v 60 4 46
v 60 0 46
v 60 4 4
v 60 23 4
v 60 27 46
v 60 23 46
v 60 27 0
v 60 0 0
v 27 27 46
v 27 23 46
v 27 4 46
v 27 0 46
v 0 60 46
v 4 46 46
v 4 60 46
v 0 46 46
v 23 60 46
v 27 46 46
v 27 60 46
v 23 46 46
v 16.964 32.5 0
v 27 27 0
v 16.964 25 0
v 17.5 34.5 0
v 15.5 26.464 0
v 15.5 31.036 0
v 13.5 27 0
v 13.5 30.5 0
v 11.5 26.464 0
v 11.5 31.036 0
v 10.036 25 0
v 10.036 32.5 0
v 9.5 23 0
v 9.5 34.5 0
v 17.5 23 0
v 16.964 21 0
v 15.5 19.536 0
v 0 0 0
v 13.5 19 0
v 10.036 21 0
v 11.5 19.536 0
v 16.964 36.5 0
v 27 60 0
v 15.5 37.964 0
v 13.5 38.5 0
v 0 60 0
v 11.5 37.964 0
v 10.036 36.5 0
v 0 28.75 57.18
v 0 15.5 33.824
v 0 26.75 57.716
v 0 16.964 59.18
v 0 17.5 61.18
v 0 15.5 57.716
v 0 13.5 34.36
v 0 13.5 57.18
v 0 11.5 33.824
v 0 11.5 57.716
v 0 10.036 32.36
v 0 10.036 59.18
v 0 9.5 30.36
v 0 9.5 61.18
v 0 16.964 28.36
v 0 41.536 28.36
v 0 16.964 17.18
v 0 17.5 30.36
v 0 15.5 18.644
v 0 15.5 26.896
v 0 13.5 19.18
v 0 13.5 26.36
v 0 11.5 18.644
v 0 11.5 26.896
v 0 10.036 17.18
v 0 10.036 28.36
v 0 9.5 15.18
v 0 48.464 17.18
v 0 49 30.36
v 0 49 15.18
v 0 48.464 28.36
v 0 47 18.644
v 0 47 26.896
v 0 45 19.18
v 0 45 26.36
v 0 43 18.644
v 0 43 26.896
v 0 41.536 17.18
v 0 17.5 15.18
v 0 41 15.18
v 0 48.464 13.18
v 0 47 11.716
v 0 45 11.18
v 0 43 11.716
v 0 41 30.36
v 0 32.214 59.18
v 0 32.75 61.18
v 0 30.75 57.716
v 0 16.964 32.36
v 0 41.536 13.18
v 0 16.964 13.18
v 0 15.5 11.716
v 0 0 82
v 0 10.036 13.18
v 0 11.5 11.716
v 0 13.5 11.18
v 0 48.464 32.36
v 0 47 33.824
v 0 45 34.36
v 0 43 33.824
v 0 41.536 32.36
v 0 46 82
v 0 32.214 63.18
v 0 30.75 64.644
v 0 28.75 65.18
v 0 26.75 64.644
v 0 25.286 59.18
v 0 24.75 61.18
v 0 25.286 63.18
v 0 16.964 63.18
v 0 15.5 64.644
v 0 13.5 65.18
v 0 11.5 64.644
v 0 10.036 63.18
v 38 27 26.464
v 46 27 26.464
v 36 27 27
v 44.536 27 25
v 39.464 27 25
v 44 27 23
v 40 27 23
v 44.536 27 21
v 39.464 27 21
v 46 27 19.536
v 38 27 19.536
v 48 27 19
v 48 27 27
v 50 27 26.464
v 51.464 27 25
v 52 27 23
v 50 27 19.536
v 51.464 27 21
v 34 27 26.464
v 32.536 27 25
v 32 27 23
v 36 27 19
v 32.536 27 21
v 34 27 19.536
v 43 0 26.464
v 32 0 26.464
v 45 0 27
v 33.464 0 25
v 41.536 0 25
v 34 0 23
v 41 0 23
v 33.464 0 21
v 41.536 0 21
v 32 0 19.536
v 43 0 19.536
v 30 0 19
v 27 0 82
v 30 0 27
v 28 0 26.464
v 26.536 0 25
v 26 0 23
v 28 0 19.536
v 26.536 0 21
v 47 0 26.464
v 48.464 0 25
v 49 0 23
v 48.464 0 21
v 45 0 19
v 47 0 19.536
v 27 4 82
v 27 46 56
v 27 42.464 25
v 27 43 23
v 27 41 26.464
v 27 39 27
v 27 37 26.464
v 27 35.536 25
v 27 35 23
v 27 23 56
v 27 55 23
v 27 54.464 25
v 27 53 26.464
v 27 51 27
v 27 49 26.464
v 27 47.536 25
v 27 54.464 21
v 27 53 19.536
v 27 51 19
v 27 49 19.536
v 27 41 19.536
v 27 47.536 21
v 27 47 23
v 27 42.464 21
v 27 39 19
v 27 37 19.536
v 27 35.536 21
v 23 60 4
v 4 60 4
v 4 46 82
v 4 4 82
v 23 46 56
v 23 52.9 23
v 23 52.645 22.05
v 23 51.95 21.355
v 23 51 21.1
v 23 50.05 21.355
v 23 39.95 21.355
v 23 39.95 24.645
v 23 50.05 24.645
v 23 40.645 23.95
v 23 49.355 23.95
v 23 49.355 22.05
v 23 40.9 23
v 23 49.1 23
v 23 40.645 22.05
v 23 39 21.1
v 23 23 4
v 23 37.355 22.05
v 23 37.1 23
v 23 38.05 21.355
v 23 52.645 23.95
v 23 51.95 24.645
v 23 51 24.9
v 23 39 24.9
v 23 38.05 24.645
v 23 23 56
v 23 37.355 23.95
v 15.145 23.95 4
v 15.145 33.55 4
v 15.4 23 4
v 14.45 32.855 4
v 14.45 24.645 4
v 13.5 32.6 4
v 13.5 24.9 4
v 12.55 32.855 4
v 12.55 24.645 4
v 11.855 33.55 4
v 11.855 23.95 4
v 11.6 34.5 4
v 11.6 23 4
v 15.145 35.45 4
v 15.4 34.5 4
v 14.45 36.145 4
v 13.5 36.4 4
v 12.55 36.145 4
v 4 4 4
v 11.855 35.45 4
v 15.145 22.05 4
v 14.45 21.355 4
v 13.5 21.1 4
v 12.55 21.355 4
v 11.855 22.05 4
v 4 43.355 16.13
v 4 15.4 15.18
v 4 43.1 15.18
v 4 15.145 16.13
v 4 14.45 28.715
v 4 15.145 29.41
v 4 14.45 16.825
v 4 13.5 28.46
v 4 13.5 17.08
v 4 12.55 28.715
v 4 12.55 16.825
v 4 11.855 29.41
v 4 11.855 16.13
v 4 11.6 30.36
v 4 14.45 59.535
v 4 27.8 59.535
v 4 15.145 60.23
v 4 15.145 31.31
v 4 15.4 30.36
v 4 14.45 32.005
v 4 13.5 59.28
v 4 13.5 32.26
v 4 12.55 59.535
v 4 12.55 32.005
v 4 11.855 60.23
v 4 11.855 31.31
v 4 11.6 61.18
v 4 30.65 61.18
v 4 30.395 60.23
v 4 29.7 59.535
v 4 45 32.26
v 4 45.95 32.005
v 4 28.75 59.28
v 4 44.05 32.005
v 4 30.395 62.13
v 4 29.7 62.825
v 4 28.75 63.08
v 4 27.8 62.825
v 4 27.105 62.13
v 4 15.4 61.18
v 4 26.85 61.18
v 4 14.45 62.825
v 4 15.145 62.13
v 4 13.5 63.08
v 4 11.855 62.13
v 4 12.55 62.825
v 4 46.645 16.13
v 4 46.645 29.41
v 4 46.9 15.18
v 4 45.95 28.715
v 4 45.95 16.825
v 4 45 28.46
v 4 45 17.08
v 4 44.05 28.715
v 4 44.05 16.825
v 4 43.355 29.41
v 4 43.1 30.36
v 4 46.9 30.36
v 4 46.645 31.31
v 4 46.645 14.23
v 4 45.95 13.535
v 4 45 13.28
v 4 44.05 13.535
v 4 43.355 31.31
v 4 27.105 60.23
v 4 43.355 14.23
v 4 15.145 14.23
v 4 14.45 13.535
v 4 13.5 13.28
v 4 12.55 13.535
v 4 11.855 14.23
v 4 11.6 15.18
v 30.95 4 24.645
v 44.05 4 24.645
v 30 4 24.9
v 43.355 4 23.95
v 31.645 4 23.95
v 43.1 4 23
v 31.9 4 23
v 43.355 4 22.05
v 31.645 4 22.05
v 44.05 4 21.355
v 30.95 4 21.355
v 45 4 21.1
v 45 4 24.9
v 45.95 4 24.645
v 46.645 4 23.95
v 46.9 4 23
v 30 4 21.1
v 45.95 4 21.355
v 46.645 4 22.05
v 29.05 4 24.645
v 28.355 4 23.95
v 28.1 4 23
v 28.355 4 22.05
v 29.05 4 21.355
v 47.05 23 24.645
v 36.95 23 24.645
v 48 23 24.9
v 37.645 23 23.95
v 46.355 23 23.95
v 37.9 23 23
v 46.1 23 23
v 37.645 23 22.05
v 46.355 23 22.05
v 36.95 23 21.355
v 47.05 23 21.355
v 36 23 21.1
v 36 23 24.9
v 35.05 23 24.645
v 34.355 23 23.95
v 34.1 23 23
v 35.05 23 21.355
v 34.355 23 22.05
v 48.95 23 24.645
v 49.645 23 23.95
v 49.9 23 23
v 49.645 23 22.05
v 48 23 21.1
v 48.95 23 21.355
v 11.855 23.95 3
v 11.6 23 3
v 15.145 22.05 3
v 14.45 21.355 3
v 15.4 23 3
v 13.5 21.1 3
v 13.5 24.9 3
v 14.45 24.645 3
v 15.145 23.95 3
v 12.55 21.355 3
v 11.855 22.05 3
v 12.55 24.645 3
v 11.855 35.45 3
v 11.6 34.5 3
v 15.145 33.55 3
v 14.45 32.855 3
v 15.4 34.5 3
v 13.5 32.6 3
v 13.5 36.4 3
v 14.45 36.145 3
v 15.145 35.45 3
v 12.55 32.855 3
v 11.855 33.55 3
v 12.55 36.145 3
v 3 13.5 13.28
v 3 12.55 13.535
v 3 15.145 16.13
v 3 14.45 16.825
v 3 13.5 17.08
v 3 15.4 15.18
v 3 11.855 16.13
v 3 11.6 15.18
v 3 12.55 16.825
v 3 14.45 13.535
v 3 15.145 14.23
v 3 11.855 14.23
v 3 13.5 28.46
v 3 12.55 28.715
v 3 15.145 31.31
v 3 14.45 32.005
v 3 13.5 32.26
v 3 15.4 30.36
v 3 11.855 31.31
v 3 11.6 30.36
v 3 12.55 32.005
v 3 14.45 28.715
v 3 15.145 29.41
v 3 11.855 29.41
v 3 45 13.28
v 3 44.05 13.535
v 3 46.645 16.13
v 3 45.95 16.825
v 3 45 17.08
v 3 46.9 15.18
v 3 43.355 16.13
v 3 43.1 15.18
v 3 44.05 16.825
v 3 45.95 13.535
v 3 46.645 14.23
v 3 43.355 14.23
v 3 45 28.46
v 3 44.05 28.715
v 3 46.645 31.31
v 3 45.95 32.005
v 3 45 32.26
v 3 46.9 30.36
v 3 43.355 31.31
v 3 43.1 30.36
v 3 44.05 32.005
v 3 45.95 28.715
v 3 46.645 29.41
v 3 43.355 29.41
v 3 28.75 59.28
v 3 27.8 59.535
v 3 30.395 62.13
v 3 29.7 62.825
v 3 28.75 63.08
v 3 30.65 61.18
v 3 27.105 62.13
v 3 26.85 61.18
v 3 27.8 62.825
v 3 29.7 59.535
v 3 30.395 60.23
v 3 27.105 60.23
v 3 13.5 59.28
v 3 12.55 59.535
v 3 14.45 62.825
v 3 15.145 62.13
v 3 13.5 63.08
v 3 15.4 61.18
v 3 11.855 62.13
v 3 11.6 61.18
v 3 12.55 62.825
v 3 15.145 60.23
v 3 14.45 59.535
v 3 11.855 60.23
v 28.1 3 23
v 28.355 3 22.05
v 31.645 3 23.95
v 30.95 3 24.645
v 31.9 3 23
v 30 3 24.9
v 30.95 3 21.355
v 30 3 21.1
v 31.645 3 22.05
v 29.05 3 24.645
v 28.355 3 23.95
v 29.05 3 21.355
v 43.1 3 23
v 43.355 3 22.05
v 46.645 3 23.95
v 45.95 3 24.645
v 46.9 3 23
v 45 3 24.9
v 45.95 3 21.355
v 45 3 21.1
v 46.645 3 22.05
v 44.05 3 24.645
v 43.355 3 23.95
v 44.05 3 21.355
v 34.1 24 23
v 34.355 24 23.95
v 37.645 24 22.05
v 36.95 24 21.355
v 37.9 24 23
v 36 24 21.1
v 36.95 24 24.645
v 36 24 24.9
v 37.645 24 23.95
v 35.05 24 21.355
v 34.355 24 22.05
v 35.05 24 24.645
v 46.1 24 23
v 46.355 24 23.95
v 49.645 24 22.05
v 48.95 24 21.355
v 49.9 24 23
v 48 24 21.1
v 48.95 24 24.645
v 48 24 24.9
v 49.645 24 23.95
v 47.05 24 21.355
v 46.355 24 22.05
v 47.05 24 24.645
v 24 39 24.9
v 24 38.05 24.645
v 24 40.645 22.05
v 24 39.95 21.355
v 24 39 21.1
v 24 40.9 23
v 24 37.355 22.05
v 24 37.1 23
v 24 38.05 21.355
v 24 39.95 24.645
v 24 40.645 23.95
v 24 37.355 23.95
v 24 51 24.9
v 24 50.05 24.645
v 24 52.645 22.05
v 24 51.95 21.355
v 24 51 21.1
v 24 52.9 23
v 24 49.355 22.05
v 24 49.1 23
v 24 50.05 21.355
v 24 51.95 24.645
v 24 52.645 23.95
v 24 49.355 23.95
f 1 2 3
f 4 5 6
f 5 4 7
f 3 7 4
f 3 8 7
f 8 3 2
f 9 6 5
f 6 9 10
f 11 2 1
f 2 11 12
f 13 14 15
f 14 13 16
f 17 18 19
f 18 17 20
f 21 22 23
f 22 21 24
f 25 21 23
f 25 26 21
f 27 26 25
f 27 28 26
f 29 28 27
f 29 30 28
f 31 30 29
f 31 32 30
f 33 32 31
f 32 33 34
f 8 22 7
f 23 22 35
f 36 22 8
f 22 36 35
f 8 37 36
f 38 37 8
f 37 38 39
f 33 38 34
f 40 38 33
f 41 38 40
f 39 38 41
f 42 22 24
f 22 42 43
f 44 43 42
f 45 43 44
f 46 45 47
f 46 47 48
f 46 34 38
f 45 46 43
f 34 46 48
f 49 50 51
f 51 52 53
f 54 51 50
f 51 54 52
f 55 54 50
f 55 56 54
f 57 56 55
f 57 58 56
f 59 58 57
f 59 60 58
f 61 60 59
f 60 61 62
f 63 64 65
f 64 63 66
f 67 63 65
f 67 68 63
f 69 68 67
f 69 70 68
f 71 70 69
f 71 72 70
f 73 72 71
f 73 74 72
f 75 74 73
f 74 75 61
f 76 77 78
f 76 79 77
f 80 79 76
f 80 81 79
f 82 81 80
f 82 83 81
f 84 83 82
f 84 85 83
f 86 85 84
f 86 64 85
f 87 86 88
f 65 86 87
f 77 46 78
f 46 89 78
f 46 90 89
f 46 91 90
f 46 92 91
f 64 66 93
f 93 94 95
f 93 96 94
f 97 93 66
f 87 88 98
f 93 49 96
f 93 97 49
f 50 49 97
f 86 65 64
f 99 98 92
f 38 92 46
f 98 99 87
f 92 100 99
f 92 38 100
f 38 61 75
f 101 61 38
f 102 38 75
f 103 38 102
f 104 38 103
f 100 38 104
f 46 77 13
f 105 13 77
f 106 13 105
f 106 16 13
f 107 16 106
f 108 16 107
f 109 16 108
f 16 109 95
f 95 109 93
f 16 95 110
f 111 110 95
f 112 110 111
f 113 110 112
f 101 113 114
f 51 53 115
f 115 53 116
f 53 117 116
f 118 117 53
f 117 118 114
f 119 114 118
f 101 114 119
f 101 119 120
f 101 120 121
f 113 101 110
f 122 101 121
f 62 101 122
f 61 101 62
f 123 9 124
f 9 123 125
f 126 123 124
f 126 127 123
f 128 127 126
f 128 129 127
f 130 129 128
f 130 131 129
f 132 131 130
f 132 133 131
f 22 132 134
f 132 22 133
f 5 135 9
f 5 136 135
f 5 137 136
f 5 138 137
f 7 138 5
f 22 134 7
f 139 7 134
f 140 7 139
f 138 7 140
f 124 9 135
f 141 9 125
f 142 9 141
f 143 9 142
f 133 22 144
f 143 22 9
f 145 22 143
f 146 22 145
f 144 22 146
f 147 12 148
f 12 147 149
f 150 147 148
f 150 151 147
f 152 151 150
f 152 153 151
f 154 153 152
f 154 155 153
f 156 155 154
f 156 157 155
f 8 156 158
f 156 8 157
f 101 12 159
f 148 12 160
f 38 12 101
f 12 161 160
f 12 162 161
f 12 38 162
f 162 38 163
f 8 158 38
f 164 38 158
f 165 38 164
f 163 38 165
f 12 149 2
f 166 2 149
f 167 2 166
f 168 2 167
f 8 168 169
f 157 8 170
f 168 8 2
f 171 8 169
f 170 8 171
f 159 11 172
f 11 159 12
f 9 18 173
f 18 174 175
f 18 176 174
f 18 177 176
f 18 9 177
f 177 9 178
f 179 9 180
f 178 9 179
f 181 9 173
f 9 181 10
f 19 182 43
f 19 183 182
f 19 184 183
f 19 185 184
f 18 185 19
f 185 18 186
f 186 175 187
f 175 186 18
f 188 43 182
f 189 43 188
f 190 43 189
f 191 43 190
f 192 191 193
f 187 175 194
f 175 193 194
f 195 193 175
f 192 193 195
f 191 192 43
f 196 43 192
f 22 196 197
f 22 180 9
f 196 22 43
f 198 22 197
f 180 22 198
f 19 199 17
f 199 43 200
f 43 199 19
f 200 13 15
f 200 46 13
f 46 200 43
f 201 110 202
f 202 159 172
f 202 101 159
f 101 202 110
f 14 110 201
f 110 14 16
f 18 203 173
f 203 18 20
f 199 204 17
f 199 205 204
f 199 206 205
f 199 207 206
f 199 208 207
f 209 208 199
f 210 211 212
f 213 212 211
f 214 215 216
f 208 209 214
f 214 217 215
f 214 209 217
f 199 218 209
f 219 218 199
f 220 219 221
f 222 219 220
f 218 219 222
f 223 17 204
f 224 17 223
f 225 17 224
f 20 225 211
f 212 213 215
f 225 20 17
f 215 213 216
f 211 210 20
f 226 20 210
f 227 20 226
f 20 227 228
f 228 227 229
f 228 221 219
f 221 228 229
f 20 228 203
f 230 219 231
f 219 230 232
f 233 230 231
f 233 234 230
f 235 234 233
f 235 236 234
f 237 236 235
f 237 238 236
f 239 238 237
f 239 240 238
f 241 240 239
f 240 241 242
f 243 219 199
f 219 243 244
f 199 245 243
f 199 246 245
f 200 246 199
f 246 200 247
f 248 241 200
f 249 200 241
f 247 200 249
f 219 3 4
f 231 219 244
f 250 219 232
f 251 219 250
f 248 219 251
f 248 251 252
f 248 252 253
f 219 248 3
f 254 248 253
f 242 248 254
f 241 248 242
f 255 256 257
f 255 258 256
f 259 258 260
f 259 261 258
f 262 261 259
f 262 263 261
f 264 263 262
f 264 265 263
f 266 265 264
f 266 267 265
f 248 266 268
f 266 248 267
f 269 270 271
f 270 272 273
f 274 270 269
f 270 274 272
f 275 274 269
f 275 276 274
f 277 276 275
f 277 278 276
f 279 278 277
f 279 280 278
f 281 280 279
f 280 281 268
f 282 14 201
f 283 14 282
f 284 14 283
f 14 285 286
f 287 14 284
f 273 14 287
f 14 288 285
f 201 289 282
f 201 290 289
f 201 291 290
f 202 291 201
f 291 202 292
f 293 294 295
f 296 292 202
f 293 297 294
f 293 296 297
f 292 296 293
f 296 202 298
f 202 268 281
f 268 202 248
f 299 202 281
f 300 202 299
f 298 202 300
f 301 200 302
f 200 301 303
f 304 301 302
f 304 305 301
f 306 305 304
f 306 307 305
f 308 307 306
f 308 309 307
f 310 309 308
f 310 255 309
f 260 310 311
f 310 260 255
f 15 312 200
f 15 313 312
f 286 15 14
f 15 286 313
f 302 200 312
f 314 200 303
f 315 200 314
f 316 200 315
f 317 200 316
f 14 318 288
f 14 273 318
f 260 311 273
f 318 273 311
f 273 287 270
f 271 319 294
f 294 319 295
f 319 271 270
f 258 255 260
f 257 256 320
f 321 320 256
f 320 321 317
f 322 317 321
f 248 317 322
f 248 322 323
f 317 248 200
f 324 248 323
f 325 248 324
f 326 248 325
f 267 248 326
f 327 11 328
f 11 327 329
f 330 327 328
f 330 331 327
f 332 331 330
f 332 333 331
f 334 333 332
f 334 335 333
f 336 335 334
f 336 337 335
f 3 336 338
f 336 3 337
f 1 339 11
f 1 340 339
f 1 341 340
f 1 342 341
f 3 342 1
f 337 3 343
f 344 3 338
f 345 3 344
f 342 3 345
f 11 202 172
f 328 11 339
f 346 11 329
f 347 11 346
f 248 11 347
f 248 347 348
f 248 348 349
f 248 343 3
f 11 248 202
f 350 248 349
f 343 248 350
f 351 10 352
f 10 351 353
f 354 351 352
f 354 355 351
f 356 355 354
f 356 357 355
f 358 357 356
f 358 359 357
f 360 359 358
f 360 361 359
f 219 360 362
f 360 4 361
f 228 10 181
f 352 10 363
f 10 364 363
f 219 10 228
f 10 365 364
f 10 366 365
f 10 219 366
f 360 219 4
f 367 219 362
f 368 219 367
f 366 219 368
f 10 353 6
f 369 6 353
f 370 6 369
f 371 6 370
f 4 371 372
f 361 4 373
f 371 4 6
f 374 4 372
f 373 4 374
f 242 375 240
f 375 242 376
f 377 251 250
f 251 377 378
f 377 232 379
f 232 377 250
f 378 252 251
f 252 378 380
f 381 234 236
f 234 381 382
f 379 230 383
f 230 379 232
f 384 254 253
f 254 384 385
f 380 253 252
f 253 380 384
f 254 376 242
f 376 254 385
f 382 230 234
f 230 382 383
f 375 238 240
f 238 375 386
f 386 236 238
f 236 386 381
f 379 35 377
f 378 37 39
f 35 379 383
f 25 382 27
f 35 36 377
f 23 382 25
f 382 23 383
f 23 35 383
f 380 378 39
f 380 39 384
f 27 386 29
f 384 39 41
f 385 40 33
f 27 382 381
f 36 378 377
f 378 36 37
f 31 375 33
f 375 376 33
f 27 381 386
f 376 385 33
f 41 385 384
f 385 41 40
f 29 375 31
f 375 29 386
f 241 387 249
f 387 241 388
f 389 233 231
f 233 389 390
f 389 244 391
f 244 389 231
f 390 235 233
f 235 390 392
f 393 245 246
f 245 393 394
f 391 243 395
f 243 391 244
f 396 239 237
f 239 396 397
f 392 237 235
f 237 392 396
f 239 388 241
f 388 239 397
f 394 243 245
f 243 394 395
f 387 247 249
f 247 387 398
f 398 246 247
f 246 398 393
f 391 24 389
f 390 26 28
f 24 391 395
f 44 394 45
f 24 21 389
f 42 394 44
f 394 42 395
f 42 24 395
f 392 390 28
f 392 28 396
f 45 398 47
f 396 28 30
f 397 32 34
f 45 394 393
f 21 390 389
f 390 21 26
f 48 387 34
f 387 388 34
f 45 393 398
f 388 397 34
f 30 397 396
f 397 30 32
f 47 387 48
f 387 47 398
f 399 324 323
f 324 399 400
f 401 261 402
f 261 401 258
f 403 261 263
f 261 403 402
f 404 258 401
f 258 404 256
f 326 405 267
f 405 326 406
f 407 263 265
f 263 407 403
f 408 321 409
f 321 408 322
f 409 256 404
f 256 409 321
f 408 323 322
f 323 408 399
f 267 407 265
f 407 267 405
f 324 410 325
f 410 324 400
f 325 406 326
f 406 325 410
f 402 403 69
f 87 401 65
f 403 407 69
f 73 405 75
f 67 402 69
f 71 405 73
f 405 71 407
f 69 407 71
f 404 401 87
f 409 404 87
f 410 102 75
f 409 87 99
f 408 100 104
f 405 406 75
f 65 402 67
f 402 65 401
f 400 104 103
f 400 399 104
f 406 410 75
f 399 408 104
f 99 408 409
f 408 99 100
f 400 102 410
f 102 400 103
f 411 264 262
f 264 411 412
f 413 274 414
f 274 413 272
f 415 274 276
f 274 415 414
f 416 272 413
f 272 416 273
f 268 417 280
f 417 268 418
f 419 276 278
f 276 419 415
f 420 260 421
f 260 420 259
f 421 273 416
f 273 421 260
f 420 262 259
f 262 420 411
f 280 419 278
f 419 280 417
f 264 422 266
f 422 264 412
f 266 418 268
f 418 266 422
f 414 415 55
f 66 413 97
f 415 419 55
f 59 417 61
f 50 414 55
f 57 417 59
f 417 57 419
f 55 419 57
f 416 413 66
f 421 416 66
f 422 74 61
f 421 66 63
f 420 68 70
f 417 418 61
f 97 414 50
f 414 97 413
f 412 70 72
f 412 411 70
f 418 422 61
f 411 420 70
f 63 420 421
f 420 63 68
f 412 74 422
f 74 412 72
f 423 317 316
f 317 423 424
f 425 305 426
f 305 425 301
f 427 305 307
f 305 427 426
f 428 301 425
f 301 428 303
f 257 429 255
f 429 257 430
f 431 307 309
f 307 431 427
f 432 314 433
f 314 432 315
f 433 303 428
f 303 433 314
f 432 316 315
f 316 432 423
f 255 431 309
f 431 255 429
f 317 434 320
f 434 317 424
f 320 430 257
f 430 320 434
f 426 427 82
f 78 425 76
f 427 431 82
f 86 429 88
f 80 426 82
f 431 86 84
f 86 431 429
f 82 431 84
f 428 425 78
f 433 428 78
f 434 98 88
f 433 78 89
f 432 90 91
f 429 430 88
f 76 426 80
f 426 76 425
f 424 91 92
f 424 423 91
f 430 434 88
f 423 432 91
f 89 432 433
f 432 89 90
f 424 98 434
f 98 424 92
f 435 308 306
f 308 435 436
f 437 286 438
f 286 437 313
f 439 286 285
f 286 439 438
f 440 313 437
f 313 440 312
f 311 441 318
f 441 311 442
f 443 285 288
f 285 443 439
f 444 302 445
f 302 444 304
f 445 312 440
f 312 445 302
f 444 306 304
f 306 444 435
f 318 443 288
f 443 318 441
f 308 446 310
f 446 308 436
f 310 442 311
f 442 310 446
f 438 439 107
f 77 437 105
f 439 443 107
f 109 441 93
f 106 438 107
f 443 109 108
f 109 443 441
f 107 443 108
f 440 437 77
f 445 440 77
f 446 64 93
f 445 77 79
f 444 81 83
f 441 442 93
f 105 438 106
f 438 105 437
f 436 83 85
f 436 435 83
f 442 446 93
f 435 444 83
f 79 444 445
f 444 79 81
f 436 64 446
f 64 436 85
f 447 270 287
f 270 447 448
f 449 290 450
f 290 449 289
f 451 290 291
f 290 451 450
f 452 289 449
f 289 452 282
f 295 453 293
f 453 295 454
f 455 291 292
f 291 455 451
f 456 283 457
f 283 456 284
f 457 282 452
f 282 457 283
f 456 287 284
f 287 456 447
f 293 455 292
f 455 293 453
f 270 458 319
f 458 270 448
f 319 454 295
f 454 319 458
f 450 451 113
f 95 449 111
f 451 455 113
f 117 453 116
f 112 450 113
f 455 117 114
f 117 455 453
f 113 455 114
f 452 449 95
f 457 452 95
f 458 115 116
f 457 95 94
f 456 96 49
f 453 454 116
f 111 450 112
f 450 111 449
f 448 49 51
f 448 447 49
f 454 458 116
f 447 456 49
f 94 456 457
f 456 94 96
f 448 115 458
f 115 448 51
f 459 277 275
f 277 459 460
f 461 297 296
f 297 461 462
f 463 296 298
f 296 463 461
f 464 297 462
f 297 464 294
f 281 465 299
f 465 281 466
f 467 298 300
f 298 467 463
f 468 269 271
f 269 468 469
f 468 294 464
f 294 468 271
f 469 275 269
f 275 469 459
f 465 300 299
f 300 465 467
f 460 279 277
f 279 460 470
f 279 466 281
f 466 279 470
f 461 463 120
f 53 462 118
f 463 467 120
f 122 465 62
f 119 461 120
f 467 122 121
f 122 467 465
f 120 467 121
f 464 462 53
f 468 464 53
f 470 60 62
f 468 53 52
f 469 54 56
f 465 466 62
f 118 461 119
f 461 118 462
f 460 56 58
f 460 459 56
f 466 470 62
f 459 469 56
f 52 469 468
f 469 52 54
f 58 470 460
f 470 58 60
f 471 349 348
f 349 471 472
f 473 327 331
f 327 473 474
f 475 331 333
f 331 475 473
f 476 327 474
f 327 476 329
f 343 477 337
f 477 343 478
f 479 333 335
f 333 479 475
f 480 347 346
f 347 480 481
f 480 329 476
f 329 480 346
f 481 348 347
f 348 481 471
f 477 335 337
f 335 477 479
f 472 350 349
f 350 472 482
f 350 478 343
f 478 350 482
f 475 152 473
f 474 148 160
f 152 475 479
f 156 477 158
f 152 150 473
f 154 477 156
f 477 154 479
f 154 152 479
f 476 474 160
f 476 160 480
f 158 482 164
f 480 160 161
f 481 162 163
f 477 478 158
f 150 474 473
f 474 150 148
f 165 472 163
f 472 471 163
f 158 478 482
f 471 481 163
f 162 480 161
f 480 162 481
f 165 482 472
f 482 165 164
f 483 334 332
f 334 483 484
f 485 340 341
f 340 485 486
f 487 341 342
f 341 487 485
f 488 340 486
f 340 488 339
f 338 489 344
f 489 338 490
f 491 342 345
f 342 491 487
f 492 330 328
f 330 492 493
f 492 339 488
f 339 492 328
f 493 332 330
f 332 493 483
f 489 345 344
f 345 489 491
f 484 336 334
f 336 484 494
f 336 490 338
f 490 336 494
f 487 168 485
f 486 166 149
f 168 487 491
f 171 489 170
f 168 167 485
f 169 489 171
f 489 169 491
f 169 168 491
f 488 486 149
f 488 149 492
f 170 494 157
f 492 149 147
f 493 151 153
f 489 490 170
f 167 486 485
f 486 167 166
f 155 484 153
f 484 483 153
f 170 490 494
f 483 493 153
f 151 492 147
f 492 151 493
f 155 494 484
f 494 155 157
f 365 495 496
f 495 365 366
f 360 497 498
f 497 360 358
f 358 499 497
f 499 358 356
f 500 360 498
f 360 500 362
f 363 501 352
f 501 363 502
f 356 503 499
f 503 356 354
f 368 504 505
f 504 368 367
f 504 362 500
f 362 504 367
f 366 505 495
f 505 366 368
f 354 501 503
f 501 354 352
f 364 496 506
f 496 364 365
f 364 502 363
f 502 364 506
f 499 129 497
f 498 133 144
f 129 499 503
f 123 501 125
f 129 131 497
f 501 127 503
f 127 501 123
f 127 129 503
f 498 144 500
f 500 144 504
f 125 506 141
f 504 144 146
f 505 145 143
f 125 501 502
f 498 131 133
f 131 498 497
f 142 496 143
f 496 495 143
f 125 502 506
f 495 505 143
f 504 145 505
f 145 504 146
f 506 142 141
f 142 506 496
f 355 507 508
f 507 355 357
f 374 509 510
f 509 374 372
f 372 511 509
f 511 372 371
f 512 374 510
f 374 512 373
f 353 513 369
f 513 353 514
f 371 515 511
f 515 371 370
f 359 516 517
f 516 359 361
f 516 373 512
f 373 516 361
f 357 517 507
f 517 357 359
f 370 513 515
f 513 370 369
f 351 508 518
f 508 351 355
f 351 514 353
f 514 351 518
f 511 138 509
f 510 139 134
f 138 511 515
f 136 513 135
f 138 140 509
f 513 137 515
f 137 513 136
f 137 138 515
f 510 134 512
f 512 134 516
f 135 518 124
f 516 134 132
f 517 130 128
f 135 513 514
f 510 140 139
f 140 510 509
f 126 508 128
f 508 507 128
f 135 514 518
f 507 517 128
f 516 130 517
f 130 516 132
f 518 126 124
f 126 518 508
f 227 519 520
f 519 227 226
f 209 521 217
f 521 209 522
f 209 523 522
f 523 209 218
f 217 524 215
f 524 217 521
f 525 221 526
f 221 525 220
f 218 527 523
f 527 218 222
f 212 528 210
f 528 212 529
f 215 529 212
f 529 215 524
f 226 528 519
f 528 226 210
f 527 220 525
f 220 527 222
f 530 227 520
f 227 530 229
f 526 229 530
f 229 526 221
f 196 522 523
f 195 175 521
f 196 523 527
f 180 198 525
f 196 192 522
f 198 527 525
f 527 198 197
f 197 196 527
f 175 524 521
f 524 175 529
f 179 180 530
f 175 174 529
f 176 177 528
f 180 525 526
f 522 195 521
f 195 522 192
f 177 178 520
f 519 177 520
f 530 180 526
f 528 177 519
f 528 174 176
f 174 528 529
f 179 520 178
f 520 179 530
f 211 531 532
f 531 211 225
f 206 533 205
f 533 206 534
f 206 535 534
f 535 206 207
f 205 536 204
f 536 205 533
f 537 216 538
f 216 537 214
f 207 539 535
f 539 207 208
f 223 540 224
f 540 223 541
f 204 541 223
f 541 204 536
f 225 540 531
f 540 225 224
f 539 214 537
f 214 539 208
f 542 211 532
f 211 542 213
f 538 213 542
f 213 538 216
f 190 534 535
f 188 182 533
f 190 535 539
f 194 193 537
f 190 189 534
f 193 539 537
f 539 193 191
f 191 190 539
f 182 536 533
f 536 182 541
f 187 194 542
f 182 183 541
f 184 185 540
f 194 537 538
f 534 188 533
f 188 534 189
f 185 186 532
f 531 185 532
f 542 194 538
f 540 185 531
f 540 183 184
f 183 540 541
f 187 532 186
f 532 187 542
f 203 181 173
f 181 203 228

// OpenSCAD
difference(){
	union() {
		cube(size = [60, 27, 46]);
		cube(size = [27, 60, 46]);
		translate(v = [0, 0, 42]) {
			cube(size = [27, 46, 40]);
		}
		translate(v = [13.5000000000, 23.0000000000, 0]) {
			rotate(a = 180, v = [1, 0, 0]) {
			}
		}
		translate(v = [13.5000000000, 34.5000000000, 0]) {
			rotate(a = 180, v = [1, 0, 0]) {
			}
		}
		translate(v = [0, 13.5000000000, 15.1800000000]) {
			rotate(a = -90, v = [0, 1, 0]) {
			}
		}
		translate(v = [0, 13.5000000000, 30.3600000000]) {
			rotate(a = -90, v = [0, 1, 0]) {
			}
		}
		translate(v = [0, 45.0000000000, 15.1800000000]) {
			rotate(a = -90, v = [0, 1, 0]) {
			}
		}
		translate(v = [0, 45.0000000000, 30.3600000000]) {
			rotate(a = -90, v = [0, 1, 0]) {
			}
		}
		translate(v = [0, 28.7500000000, 61.1800000000]) {
			rotate(a = -90, v = [0, 1, 0]) {
			}
		}
		translate(v = [0, 13.5000000000, 61.1800000000]) {
			rotate(a = -90, v = [0, 1, 0]) {
			}
		}
		translate(v = [30.0000000000, 0, 23.0000000000]) {
			rotate(a = 90, v = [1, 0, 0]) {
			}
		}
		translate(v = [45.0000000000, 0, 23.0000000000]) {
			rotate(a = 90, v = [1, 0, 0]) {
			}
		}
		translate(v = [36.0000000000, 27, 23.0000000000]) {
			rotate(a = -90, v = [1, 0, 0]) {
			}
		}
		translate(v = [48.0000000000, 27, 23.0000000000]) {
			rotate(a = -90, v = [1, 0, 0]) {
			}
		}
		translate(v = [27, 39.0000000000, 23.0000000000]) {
			rotate(a = 90, v = [0, 1, 0]) {
			}
		}
		translate(v = [27, 51.0000000000, 23.0000000000]) {
			rotate(a = 90, v = [0, 1, 0]) {
			}
		}
	}
	/* Holes Below*/
	union(){
		translate(v = [4, 4, 4]) {
			cube(size = [19, 60, 1000]);
			cube(size = [60, 19, 1000]);
		}
		translate(v = [4, 4, 56]) {
			cube(size = [100, 100, 100]);
		}
		translate(v = [13.5000000000, 23.0000000000, 0]){
			rotate(a = 180, v = [1, 0, 0]){
				union() {
					union() {
						translate(v = [0, 0, -5]) {
							cylinder($fn = 12, h = 5, r = 1.9000000000);
						}
						translate(v = [0, 0, -3]) {
							cylinder($fn = 12, h = 3, r1 = 1.9000000000, r2 = 4);
						}
					}
					cylinder($fn = 12, h = 1, r = 4);
				}
			}
		}
		translate(v = [13.5000000000, 34.5000000000, 0]){
			rotate(a = 180, v = [1, 0, 0]){
				union() {
					union() {
						translate(v = [0, 0, -5]) {
							cylinder($fn = 12, h = 5, r = 1.9000000000);
						}
						translate(v = [0, 0, -3]) {
							cylinder($fn = 12, h = 3, r1 = 1.9000000000, r2 = 4);
						}
					}
					cylinder($fn = 12, h = 1, r = 4);
				}
			}
		}
		translate(v = [0, 13.5000000000, 15.1800000000]){
			rotate(a = -90, v = [0, 1, 0]){
				union() {
					union() {
						translate(v = [0, 0, -5]) {
							cylinder($fn = 12, h = 5, r = 1.9000000000);
						}
						translate(v = [0, 0, -3]) {
							cylinder($fn = 12, h = 3, r1 = 1.9000000000, r2 = 4);
						}
					}
					cylinder($fn = 12, h = 1, r = 4);
				}
			}
		}
		translate(v = [0, 13.5000000000, 30.3600000000]){
			rotate(a = -90, v = [0, 1, 0]){
				union() {
					union() {
						translate(v = [0, 0, -5]) {
							cylinder($fn = 12, h = 5, r = 1.9000000000);
						}
						translate(v = [0, 0, -3]) {
							cylinder($fn = 12, h = 3, r1 = 1.9000000000, r2 = 4);
						}
					}
					cylinder($fn = 12, h = 1, r = 4);
				}
			}
		}
		translate(v = [0, 45.0000000000, 15.1800000000]){
			rotate(a = -90, v = [0, 1, 0]){
				union() {
					union() {
						translate(v = [0, 0, -5]) {
							cylinder($fn = 12, h = 5, r = 1.9000000000);
						}
						translate(v = [0, 0, -3]) {
							cylinder($fn = 12, h = 3, r1 = 1.9000000000, r2 = 4);
						}
					}
					cylinder($fn = 12, h = 1, r = 4);
				}
			}
		}
		translate(v = [0, 45.0000000000, 30.3600000000]){
			rotate(a = -90, v = [0, 1, 0]){
				union() {
					union() {
						translate(v = [0, 0, -5]) {
							cylinder($fn = 12, h = 5, r = 1.9000000000);
						}
						translate(v = [0, 0, -3]) {
							cylinder($fn = 12, h = 3, r1 = 1.9000000000, r2 = 4);
						}
					}
					cylinder($fn = 12, h = 1, r = 4);
				}
			}
		}
		translate(v = [0, 28.7500000000, 61.1800000000]){
			rotate(a = -90, v = [0, 1, 0]){
				union() {
					union() {
						translate(v = [0, 0, -5]) {
							cylinder($fn = 12, h = 5, r = 1.9000000000);
						}
						translate(v = [0, 0, -3]) {
							cylinder($fn = 12, h = 3, r1 = 1.9000000000, r2 = 4);
						}
					}
					cylinder($fn = 12, h = 1, r = 4);
				}
			}
		}
		translate(v = [0, 13.5000000000, 61.1800000000]){
			rotate(a = -90, v = [0, 1, 0]){
				union() {
					union() {
						translate(v = [0, 0, -5]) {
							cylinder($fn = 12, h = 5, r = 1.9000000000);
						}
						translate(v = [0, 0, -3]) {
							cylinder($fn = 12, h = 3, r1 = 1.9000000000, r2 = 4);
						}
					}
					cylinder($fn = 12, h = 1, r = 4);
				}
			}
		}
		translate(v = [30.0000000000, 0, 23.0000000000]){
			rotate(a = 90, v = [1, 0, 0]){
				union() {
					union() {
						translate(v = [0, 0, -5]) {
							cylinder($fn = 12, h = 5, r = 1.9000000000);
						}
						translate(v = [0, 0, -3]) {
							cylinder($fn = 12, h = 3, r1 = 1.9000000000, r2 = 4);
						}
					}
					cylinder($fn = 12, h = 1, r = 4);
				}
			}
		}
		translate(v = [45.0000000000, 0, 23.0000000000]){
			rotate(a = 90, v = [1, 0, 0]){
				union() {
					union() {
						translate(v = [0, 0, -5]) {
							cylinder($fn = 12, h = 5, r = 1.9000000000);
						}
						translate(v = [0, 0, -3]) {
							cylinder($fn = 12, h = 3, r1 = 1.9000000000, r2 = 4);
						}
					}
					cylinder($fn = 12, h = 1, r = 4);
				}
			}
		}
		translate(v = [36.0000000000, 27, 23.0000000000]){
			rotate(a = -90, v = [1, 0, 0]){
				union() {
					union() {
						translate(v = [0, 0, -5]) {
							cylinder($fn = 12, h = 5, r = 1.9000000000);
						}
						translate(v = [0, 0, -3]) {
							cylinder($fn = 12, h = 3, r1 = 1.9000000000, r2 = 4);
						}
					}
					cylinder($fn = 12, h = 1, r = 4);
				}
			}
		}
		translate(v = [48.0000000000, 27, 23.0000000000]){
			rotate(a = -90, v = [1, 0, 0]){
				union() {
					union() {
						translate(v = [0, 0, -5]) {
							cylinder($fn = 12, h = 5, r = 1.9000000000);
						}
						translate(v = [0, 0, -3]) {
							cylinder($fn = 12, h = 3, r1 = 1.9000000000, r2 = 4);
						}
					}
					cylinder($fn = 12, h = 1, r = 4);
				}
			}
		}
		translate(v = [27, 39.0000000000, 23.0000000000]){
			rotate(a = 90, v = [0, 1, 0]){
				union() {
					union() {
						translate(v = [0, 0, -5]) {
							cylinder($fn = 12, h = 5, r = 1.9000000000);
						}
						translate(v = [0, 0, -3]) {
							cylinder($fn = 12, h = 3, r1 = 1.9000000000, r2 = 4);
						}
					}
					cylinder($fn = 12, h = 1, r = 4);
				}
			}
		}
		translate(v = [27, 51.0000000000, 23.0000000000]){
			rotate(a = 90, v = [0, 1, 0]){
				union() {
					union() {
						translate(v = [0, 0, -5]) {
							cylinder($fn = 12, h = 5, r = 1.9000000000);
						}
						translate(v = [0, 0, -3]) {
							cylinder($fn = 12, h = 3, r1 = 1.9000000000, r2 = 4);
						}
					}
					cylinder($fn = 12, h = 1, r = 4);
				}
			}
		}
	} /* End Holes */ 
}
